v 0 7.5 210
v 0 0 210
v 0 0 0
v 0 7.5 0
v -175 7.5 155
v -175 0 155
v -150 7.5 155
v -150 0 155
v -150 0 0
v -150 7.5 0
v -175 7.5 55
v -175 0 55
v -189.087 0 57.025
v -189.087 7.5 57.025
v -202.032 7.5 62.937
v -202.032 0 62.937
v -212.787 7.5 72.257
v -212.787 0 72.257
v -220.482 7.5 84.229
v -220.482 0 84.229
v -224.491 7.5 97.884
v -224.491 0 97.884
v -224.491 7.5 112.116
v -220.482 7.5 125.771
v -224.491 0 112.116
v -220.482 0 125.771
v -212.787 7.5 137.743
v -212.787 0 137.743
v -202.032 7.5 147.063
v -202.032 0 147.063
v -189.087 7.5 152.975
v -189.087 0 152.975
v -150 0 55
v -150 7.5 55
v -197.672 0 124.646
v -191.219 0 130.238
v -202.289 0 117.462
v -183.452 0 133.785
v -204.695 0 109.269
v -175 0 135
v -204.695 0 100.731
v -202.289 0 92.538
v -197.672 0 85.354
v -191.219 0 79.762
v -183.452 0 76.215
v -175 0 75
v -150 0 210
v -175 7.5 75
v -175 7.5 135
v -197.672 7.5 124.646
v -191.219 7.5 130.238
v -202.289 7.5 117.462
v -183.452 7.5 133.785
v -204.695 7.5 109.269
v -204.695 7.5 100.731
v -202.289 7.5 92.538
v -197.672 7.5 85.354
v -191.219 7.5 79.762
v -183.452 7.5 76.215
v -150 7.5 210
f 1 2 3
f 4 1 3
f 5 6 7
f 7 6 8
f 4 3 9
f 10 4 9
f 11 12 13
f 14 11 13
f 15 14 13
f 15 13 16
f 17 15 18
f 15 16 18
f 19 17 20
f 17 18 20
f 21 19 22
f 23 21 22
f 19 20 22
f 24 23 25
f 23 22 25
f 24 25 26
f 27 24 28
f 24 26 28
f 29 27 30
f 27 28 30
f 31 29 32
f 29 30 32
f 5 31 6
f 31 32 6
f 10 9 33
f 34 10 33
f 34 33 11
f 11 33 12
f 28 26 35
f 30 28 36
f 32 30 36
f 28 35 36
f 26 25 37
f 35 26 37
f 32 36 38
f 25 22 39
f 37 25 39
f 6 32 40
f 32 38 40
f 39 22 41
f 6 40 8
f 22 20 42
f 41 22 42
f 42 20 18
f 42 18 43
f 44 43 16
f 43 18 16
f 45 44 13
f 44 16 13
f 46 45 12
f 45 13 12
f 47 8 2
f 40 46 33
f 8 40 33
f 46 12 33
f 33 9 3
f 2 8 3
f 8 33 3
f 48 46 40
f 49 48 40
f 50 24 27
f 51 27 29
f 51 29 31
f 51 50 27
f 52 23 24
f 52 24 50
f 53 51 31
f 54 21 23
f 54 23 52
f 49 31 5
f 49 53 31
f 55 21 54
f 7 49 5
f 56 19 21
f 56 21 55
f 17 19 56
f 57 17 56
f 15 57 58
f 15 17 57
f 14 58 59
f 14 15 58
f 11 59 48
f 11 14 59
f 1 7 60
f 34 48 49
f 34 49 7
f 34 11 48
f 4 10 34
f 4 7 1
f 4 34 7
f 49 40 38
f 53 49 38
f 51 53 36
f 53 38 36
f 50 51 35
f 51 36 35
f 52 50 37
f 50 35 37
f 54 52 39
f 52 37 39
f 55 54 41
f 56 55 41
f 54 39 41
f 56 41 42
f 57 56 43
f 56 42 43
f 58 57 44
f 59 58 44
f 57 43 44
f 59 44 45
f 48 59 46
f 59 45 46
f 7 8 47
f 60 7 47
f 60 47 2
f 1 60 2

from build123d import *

# Parameters (mm, degrees)
BOSS_EXTRUDE1_DEPTH = 7.5


with BuildPart() as part:
    # Sketch1 → Boss-Extrude1 (new body)
    with BuildSketch(Plane(origin=(0, 0, 0), x_dir=(1, 0, 0), z_dir=(0, 1, 0))):
        with BuildLine():
            Line((0, 0), (-150, 0))
            Line((-150, 0), (-150, -55))
            Line((-150, -55), (-175, -55))
            ThreePointArc((-175, -55), (-225, -105), (-175, -155))
            Line((-175, -155), (-150, -155))
            Line((-150, -155), (-150, -210))
            Line((-150, -210), (0, -210))
            Line((0, -210), (0, 0))
        make_face()
        with BuildLine():
            Line((-175, -75), (-175, -135))
            ThreePointArc((-175, -135), (-205, -105), (-175, -75))
        make_face(mode=Mode.SUBTRACT)
    extrude(amount=BOSS_EXTRUDE1_DEPTH)


solid = part.part
